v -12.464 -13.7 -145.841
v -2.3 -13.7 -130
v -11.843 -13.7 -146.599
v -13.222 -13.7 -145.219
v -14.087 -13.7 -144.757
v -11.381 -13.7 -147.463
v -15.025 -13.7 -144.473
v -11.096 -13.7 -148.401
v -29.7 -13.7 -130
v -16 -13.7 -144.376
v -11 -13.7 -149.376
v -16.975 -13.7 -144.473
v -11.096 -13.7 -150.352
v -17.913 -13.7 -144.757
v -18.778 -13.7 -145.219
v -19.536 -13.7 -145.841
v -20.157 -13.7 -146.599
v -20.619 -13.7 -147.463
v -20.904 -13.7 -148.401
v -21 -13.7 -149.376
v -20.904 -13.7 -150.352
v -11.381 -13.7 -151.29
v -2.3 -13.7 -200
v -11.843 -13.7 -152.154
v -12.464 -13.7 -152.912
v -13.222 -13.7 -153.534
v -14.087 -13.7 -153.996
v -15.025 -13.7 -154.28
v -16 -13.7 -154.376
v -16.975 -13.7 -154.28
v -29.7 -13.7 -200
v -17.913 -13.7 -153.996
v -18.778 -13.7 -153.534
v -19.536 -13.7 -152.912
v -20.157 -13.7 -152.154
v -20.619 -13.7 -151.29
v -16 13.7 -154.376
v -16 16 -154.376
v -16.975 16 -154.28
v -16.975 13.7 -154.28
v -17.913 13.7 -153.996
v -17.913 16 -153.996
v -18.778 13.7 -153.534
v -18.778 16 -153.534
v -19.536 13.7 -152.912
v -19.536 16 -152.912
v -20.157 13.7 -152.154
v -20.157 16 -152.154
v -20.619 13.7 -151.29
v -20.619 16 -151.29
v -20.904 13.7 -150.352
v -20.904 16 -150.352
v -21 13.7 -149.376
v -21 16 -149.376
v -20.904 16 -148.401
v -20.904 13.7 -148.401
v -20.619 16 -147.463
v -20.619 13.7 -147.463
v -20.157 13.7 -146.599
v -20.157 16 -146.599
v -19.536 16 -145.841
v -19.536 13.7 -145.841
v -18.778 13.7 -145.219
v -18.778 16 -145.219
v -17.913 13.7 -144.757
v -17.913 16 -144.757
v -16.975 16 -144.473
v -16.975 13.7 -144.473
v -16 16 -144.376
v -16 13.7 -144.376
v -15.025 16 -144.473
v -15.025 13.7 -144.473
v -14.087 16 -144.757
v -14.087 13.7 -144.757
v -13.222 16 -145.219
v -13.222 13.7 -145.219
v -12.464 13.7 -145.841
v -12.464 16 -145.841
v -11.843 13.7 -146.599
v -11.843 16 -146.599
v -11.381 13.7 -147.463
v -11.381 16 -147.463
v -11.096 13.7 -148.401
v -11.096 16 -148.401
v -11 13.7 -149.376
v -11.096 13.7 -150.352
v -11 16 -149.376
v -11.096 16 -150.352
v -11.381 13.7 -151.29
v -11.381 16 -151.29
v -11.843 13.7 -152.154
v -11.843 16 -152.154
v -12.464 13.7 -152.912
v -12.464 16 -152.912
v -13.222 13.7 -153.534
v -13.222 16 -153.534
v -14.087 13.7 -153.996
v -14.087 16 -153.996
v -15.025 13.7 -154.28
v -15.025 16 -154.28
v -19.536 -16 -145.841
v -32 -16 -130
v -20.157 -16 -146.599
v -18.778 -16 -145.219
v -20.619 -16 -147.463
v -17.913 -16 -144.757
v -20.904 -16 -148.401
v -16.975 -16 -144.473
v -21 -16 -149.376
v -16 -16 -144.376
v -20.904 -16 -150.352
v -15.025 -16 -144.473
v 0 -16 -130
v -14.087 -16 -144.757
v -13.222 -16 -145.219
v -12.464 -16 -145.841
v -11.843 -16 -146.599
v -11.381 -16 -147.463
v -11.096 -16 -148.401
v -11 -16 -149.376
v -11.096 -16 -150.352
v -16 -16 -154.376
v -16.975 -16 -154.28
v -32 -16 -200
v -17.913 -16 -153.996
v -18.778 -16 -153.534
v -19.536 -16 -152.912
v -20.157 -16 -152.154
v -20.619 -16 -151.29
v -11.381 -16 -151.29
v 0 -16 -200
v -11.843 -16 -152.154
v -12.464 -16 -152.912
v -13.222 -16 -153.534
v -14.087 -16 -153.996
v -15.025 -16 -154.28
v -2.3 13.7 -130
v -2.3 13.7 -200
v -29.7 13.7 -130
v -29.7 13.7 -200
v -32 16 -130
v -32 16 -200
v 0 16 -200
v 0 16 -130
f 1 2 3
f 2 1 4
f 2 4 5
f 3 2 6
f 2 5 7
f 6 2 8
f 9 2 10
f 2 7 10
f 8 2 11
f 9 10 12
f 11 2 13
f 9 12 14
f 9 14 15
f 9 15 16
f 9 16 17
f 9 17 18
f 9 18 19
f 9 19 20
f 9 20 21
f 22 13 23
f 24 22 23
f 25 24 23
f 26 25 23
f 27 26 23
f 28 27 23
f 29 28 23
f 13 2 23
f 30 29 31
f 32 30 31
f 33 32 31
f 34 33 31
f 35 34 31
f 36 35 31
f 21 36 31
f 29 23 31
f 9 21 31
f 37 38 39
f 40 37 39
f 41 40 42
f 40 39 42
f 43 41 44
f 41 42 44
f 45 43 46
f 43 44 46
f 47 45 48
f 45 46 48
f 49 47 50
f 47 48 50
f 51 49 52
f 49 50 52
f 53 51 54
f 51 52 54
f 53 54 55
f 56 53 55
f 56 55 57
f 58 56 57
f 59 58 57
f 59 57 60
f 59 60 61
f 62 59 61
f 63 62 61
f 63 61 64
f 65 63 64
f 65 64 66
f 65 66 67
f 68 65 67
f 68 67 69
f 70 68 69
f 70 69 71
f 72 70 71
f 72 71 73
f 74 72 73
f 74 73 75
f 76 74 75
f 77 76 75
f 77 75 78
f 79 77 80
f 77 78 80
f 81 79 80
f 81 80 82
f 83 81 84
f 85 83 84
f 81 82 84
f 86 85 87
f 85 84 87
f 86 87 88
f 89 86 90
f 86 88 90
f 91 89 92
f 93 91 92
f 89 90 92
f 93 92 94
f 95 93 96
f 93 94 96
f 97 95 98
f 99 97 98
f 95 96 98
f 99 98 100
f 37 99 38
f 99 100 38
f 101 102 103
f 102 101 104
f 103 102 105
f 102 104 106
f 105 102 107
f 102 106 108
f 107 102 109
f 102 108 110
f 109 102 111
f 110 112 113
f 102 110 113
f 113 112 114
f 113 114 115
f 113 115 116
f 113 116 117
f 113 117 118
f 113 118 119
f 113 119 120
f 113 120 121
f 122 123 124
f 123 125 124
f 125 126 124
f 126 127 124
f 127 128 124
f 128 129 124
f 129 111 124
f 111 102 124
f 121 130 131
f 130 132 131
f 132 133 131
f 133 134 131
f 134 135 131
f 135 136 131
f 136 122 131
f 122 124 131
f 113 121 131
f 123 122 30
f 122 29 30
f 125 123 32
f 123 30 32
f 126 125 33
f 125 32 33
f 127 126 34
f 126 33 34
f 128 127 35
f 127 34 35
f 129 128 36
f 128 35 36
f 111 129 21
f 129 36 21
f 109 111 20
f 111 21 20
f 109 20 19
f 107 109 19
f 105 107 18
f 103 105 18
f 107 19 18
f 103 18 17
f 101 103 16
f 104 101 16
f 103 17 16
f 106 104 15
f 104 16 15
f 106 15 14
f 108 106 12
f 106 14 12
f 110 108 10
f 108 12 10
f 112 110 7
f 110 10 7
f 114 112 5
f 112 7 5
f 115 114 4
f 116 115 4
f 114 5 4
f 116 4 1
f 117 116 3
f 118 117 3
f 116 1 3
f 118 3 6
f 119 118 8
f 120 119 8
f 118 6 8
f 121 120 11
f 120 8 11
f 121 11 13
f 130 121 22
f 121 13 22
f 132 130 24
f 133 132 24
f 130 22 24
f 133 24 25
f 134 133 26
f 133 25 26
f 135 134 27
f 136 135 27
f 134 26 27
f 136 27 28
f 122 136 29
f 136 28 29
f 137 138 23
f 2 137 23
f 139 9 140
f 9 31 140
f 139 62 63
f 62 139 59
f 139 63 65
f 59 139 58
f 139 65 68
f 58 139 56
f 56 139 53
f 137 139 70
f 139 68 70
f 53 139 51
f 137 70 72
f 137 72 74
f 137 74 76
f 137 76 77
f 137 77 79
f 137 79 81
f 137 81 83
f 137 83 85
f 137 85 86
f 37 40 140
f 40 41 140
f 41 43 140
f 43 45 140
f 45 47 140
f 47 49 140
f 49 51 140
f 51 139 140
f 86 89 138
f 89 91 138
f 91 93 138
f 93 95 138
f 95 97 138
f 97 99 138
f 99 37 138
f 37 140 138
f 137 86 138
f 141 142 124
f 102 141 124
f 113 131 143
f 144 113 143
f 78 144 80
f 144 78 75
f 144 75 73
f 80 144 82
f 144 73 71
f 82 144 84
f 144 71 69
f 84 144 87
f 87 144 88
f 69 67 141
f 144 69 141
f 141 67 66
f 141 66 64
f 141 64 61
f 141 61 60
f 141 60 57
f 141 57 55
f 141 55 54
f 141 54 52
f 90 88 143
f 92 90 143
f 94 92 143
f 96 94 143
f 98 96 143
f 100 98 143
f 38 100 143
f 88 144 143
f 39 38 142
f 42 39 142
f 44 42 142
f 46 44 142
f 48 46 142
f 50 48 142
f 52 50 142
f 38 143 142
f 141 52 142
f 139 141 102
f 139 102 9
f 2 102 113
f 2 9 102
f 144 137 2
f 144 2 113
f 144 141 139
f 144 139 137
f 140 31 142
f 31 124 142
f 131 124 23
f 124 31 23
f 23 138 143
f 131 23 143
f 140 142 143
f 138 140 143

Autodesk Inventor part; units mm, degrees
ref_plane "YZ Plane" through (0, 0, 0) normal (1, 0, 0) x (0, 1, 0)
ref_plane "XZ Plane" through (0, 0, 0) normal (0, 1, 0) x (-1, 0, 0)
ref_plane "XY Plane" through (0, 0, 0) normal (0, 0, 1) x (1, 0, 0)
sketch "スケッチ2" plane through (0, 0, 0) normal (0, 1, 0) x (-1, 0, 0)
  line L0 (43, -215) -> (-441.4, 962.3333)
  line L1 (32, 0) -> (32, -200)
  line L2 (0, 0) -> (0, -200)
  line L3 (32, 0) -> (0, 0)
  line L4 (16, 0) -> (16, -149.3765)
  line L5 (32, -200) -> (0, -200)
  dimension "d0" = 50.6234
ref_plane "作業平面1" through (-32, 0, -200) normal (0, 0, 1) x (1, 0, 0)
sketch "スケッチ5" plane through (-32, 0, -200) normal (0, 0, 1) x (1, 0, 0)
  line L0 (0, -16) -> (32, -16)
  line L1 (32, -16) -> (32, 16)
  line L2 (32, 16) -> (0, 16)
  line L3 (0, 16) -> (0, -16)
  line L4 (0, -16) -> (32, 16) construction
  line L5 (32, -16) -> (0, 16) construction
  line L6 (29.7, -13.7) -> (2.3, -13.7)
  line L7 (2.3, -13.7) -> (2.3, 13.7)
  line L8 (2.3, 13.7) -> (29.7, 13.7)
  line L9 (29.7, 13.7) -> (29.7, -13.7)
  point P0 (32, 0)
  point P1 (16, 0)
  dimension "d7" = 32
  dimension "d8" = 32
  dimension "d9" = 2.3
extrude "押し出し2" add sketch "スケッチ5" along normal blind 70
sketch "スケッチ6" plane through (-32, -16, -200) normal (0, -1, 0) x (1, 0, 0)
  line L0 (-11, -15) -> (473.4, 1162.3333) projected
  line L1 (16, 200) -> (16, 50.6235) projected
  point P0 (32, 200)
hole "穴1" at (-16, -16, -149.3765) direction (0, 1, 0) diameter 10 end through all
properties part number "ステア棒"
